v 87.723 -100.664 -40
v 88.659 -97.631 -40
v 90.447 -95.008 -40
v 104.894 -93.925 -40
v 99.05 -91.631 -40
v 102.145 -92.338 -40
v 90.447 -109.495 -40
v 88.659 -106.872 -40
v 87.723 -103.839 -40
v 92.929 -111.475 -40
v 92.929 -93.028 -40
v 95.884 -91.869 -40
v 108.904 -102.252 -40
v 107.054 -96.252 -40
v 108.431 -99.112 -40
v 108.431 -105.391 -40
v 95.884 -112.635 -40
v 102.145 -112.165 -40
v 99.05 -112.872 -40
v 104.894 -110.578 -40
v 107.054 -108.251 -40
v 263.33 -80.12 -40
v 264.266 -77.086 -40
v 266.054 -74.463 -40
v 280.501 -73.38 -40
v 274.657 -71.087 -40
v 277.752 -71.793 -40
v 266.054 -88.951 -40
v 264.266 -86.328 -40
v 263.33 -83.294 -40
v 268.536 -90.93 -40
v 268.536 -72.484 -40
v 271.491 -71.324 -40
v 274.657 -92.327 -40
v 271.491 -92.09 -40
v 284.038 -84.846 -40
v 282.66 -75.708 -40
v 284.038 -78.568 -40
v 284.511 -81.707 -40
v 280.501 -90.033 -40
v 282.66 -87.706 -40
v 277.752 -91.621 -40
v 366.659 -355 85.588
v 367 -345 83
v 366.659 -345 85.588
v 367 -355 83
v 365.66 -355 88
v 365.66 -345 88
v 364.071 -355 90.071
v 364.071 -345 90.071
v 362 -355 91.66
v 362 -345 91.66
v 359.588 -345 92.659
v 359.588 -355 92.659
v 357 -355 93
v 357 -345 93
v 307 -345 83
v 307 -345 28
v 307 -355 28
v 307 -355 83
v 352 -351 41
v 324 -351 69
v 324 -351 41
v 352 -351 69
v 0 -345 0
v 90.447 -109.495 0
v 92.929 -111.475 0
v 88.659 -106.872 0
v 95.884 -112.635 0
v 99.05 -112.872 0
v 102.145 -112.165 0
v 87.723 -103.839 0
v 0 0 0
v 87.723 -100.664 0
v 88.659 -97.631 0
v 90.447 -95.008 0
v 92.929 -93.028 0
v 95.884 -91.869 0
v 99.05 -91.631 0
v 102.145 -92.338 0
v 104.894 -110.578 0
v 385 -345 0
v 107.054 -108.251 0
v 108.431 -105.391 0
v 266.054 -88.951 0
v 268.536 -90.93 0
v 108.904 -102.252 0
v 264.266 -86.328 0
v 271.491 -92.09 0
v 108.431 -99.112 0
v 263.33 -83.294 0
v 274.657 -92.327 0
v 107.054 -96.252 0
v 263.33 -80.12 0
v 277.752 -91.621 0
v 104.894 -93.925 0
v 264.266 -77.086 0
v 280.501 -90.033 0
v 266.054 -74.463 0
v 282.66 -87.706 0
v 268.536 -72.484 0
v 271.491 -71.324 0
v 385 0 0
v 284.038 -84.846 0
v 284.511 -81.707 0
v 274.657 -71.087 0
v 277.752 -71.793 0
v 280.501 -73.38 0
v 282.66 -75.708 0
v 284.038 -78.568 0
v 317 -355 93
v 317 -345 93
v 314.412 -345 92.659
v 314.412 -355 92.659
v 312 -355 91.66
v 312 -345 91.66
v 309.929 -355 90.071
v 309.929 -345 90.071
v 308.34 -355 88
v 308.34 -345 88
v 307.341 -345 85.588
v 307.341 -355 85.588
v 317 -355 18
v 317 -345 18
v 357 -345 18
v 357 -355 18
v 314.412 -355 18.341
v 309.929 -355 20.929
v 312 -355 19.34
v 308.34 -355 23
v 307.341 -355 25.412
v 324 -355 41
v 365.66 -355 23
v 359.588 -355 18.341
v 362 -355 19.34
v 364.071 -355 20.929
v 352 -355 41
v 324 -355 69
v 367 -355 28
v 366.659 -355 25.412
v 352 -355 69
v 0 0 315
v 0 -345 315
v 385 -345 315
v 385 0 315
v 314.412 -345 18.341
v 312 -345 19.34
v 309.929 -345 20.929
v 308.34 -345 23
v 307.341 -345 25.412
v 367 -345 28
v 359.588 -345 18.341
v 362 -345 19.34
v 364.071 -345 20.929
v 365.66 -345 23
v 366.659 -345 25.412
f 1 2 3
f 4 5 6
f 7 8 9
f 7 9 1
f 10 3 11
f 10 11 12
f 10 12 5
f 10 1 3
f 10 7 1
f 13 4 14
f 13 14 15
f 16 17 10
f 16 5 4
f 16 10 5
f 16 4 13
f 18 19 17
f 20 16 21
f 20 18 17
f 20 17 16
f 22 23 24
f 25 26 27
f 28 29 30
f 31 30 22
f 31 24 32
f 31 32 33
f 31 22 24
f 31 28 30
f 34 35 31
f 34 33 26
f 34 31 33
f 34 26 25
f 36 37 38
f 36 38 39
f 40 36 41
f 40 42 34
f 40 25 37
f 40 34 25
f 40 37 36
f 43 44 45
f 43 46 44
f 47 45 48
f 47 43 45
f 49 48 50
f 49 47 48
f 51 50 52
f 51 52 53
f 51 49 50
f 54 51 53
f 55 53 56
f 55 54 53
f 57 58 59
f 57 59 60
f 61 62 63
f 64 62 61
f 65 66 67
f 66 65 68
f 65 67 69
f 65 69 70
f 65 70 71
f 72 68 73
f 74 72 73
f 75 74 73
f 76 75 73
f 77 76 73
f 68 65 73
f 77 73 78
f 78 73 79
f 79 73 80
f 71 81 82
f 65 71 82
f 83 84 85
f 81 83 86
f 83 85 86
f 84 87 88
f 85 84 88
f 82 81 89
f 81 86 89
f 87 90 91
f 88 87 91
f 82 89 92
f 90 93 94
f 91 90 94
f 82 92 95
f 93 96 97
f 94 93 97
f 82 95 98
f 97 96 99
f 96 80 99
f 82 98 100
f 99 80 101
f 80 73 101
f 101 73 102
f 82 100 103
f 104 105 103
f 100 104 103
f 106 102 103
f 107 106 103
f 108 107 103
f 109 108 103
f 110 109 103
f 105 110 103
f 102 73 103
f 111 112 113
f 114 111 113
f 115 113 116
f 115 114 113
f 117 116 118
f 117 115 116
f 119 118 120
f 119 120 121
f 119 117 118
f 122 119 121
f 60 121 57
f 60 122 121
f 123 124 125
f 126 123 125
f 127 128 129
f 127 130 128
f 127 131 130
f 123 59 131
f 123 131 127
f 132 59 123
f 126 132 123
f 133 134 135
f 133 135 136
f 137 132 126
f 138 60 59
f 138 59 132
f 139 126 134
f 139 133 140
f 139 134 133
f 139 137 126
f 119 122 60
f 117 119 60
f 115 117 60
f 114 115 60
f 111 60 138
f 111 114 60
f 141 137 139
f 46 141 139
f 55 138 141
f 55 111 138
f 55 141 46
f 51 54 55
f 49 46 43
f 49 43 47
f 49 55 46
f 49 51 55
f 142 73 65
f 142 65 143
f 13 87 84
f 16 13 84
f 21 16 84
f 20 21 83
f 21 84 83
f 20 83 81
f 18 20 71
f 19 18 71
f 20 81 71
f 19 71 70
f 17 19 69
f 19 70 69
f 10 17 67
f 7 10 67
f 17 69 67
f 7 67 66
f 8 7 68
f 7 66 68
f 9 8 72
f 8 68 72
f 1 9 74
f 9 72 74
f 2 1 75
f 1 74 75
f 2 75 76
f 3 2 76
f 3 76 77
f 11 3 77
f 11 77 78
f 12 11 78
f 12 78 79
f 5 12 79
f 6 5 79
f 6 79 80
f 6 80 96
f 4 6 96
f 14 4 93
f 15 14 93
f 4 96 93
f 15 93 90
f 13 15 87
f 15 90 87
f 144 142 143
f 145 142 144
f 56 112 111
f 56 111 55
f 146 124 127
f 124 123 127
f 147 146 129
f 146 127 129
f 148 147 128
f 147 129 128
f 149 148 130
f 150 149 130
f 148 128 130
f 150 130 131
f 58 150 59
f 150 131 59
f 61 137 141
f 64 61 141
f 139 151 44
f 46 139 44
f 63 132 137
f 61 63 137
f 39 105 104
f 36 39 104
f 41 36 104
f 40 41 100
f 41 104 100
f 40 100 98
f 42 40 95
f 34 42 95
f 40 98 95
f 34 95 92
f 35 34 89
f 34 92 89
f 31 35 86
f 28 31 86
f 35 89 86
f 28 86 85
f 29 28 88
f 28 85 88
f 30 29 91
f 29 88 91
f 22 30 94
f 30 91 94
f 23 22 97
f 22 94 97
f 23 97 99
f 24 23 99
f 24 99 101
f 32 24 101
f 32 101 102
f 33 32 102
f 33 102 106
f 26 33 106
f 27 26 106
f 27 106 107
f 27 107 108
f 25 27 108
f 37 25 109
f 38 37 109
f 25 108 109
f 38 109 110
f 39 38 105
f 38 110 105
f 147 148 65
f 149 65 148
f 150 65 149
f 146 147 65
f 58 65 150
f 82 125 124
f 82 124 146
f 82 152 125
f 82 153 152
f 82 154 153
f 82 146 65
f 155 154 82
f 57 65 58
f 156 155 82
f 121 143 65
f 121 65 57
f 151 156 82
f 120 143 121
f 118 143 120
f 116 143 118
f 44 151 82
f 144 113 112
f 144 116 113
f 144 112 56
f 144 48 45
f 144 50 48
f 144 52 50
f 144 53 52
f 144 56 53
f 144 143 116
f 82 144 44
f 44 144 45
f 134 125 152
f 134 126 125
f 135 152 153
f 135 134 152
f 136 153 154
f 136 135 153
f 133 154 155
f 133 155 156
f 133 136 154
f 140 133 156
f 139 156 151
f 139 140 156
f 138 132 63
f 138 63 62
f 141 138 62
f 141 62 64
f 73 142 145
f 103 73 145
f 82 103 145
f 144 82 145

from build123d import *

# Parameters (mm, degrees)
F0_W      = 385
F0_H      = 315
F1_DEPTH  = 345
F2_W      = 60
F2_H      = 75
F3_DEPTH  = 10
F4_R      = 10
F5_W      = 28
F5_H      = 28
F6_DEPTH  = 4
F7_R      = 10.65
F8_DEPTH  = 40
F9_R      = 10.65
F10_DEPTH = 40


with BuildPart() as f1:
    # F0 (on Front) → F1 (new body)
    with BuildSketch(Plane.XZ):
        with Locations((192.5, 157.5)):
            Rectangle(F0_W, F0_H)
    extrude(amount=F1_DEPTH)

    # F2 (on face) → F3 (join)
    with BuildSketch(Plane.XZ.offset(345)):
        with Locations((337, 55.5)):
            Rectangle(F2_W, F2_H)
    extrude(amount=F3_DEPTH)

    # F4
    f4_edges = [f1.edges().sort_by_distance(p)[0] for p in [
        (367, -350, 93),
        (367, -350, 18),
        (307, -350, 93),
        (307, -350, 18),
    ]]
    fillet(f4_edges, radius=F4_R)

    # F5 (on face) → F6 (cut)
    with BuildSketch(Plane.XZ.offset(355)):
        with Locations((338, 55)):
            Rectangle(F5_W, F5_H)
    extrude(amount=-F6_DEPTH, mode=Mode.SUBTRACT)

    # F7 (on face) → F8 (join)
    with BuildSketch(Plane(origin=(0, 0, 0), x_dir=(1, 0, 0), z_dir=(0, 0, -1))):
        with Locations((98.254092, 102.251634)):
            Circle(F7_R)
    extrude(amount=F8_DEPTH)

    # F9 (on face) → F10 (join)
    with BuildSketch(Plane(origin=(0, 0, 0), x_dir=(1, 0, 0), z_dir=(0, 0, -1))):
        with Locations((273.860931, 81.706926)):
            Circle(F9_R)
    extrude(amount=F10_DEPTH)


solid = f1.part
